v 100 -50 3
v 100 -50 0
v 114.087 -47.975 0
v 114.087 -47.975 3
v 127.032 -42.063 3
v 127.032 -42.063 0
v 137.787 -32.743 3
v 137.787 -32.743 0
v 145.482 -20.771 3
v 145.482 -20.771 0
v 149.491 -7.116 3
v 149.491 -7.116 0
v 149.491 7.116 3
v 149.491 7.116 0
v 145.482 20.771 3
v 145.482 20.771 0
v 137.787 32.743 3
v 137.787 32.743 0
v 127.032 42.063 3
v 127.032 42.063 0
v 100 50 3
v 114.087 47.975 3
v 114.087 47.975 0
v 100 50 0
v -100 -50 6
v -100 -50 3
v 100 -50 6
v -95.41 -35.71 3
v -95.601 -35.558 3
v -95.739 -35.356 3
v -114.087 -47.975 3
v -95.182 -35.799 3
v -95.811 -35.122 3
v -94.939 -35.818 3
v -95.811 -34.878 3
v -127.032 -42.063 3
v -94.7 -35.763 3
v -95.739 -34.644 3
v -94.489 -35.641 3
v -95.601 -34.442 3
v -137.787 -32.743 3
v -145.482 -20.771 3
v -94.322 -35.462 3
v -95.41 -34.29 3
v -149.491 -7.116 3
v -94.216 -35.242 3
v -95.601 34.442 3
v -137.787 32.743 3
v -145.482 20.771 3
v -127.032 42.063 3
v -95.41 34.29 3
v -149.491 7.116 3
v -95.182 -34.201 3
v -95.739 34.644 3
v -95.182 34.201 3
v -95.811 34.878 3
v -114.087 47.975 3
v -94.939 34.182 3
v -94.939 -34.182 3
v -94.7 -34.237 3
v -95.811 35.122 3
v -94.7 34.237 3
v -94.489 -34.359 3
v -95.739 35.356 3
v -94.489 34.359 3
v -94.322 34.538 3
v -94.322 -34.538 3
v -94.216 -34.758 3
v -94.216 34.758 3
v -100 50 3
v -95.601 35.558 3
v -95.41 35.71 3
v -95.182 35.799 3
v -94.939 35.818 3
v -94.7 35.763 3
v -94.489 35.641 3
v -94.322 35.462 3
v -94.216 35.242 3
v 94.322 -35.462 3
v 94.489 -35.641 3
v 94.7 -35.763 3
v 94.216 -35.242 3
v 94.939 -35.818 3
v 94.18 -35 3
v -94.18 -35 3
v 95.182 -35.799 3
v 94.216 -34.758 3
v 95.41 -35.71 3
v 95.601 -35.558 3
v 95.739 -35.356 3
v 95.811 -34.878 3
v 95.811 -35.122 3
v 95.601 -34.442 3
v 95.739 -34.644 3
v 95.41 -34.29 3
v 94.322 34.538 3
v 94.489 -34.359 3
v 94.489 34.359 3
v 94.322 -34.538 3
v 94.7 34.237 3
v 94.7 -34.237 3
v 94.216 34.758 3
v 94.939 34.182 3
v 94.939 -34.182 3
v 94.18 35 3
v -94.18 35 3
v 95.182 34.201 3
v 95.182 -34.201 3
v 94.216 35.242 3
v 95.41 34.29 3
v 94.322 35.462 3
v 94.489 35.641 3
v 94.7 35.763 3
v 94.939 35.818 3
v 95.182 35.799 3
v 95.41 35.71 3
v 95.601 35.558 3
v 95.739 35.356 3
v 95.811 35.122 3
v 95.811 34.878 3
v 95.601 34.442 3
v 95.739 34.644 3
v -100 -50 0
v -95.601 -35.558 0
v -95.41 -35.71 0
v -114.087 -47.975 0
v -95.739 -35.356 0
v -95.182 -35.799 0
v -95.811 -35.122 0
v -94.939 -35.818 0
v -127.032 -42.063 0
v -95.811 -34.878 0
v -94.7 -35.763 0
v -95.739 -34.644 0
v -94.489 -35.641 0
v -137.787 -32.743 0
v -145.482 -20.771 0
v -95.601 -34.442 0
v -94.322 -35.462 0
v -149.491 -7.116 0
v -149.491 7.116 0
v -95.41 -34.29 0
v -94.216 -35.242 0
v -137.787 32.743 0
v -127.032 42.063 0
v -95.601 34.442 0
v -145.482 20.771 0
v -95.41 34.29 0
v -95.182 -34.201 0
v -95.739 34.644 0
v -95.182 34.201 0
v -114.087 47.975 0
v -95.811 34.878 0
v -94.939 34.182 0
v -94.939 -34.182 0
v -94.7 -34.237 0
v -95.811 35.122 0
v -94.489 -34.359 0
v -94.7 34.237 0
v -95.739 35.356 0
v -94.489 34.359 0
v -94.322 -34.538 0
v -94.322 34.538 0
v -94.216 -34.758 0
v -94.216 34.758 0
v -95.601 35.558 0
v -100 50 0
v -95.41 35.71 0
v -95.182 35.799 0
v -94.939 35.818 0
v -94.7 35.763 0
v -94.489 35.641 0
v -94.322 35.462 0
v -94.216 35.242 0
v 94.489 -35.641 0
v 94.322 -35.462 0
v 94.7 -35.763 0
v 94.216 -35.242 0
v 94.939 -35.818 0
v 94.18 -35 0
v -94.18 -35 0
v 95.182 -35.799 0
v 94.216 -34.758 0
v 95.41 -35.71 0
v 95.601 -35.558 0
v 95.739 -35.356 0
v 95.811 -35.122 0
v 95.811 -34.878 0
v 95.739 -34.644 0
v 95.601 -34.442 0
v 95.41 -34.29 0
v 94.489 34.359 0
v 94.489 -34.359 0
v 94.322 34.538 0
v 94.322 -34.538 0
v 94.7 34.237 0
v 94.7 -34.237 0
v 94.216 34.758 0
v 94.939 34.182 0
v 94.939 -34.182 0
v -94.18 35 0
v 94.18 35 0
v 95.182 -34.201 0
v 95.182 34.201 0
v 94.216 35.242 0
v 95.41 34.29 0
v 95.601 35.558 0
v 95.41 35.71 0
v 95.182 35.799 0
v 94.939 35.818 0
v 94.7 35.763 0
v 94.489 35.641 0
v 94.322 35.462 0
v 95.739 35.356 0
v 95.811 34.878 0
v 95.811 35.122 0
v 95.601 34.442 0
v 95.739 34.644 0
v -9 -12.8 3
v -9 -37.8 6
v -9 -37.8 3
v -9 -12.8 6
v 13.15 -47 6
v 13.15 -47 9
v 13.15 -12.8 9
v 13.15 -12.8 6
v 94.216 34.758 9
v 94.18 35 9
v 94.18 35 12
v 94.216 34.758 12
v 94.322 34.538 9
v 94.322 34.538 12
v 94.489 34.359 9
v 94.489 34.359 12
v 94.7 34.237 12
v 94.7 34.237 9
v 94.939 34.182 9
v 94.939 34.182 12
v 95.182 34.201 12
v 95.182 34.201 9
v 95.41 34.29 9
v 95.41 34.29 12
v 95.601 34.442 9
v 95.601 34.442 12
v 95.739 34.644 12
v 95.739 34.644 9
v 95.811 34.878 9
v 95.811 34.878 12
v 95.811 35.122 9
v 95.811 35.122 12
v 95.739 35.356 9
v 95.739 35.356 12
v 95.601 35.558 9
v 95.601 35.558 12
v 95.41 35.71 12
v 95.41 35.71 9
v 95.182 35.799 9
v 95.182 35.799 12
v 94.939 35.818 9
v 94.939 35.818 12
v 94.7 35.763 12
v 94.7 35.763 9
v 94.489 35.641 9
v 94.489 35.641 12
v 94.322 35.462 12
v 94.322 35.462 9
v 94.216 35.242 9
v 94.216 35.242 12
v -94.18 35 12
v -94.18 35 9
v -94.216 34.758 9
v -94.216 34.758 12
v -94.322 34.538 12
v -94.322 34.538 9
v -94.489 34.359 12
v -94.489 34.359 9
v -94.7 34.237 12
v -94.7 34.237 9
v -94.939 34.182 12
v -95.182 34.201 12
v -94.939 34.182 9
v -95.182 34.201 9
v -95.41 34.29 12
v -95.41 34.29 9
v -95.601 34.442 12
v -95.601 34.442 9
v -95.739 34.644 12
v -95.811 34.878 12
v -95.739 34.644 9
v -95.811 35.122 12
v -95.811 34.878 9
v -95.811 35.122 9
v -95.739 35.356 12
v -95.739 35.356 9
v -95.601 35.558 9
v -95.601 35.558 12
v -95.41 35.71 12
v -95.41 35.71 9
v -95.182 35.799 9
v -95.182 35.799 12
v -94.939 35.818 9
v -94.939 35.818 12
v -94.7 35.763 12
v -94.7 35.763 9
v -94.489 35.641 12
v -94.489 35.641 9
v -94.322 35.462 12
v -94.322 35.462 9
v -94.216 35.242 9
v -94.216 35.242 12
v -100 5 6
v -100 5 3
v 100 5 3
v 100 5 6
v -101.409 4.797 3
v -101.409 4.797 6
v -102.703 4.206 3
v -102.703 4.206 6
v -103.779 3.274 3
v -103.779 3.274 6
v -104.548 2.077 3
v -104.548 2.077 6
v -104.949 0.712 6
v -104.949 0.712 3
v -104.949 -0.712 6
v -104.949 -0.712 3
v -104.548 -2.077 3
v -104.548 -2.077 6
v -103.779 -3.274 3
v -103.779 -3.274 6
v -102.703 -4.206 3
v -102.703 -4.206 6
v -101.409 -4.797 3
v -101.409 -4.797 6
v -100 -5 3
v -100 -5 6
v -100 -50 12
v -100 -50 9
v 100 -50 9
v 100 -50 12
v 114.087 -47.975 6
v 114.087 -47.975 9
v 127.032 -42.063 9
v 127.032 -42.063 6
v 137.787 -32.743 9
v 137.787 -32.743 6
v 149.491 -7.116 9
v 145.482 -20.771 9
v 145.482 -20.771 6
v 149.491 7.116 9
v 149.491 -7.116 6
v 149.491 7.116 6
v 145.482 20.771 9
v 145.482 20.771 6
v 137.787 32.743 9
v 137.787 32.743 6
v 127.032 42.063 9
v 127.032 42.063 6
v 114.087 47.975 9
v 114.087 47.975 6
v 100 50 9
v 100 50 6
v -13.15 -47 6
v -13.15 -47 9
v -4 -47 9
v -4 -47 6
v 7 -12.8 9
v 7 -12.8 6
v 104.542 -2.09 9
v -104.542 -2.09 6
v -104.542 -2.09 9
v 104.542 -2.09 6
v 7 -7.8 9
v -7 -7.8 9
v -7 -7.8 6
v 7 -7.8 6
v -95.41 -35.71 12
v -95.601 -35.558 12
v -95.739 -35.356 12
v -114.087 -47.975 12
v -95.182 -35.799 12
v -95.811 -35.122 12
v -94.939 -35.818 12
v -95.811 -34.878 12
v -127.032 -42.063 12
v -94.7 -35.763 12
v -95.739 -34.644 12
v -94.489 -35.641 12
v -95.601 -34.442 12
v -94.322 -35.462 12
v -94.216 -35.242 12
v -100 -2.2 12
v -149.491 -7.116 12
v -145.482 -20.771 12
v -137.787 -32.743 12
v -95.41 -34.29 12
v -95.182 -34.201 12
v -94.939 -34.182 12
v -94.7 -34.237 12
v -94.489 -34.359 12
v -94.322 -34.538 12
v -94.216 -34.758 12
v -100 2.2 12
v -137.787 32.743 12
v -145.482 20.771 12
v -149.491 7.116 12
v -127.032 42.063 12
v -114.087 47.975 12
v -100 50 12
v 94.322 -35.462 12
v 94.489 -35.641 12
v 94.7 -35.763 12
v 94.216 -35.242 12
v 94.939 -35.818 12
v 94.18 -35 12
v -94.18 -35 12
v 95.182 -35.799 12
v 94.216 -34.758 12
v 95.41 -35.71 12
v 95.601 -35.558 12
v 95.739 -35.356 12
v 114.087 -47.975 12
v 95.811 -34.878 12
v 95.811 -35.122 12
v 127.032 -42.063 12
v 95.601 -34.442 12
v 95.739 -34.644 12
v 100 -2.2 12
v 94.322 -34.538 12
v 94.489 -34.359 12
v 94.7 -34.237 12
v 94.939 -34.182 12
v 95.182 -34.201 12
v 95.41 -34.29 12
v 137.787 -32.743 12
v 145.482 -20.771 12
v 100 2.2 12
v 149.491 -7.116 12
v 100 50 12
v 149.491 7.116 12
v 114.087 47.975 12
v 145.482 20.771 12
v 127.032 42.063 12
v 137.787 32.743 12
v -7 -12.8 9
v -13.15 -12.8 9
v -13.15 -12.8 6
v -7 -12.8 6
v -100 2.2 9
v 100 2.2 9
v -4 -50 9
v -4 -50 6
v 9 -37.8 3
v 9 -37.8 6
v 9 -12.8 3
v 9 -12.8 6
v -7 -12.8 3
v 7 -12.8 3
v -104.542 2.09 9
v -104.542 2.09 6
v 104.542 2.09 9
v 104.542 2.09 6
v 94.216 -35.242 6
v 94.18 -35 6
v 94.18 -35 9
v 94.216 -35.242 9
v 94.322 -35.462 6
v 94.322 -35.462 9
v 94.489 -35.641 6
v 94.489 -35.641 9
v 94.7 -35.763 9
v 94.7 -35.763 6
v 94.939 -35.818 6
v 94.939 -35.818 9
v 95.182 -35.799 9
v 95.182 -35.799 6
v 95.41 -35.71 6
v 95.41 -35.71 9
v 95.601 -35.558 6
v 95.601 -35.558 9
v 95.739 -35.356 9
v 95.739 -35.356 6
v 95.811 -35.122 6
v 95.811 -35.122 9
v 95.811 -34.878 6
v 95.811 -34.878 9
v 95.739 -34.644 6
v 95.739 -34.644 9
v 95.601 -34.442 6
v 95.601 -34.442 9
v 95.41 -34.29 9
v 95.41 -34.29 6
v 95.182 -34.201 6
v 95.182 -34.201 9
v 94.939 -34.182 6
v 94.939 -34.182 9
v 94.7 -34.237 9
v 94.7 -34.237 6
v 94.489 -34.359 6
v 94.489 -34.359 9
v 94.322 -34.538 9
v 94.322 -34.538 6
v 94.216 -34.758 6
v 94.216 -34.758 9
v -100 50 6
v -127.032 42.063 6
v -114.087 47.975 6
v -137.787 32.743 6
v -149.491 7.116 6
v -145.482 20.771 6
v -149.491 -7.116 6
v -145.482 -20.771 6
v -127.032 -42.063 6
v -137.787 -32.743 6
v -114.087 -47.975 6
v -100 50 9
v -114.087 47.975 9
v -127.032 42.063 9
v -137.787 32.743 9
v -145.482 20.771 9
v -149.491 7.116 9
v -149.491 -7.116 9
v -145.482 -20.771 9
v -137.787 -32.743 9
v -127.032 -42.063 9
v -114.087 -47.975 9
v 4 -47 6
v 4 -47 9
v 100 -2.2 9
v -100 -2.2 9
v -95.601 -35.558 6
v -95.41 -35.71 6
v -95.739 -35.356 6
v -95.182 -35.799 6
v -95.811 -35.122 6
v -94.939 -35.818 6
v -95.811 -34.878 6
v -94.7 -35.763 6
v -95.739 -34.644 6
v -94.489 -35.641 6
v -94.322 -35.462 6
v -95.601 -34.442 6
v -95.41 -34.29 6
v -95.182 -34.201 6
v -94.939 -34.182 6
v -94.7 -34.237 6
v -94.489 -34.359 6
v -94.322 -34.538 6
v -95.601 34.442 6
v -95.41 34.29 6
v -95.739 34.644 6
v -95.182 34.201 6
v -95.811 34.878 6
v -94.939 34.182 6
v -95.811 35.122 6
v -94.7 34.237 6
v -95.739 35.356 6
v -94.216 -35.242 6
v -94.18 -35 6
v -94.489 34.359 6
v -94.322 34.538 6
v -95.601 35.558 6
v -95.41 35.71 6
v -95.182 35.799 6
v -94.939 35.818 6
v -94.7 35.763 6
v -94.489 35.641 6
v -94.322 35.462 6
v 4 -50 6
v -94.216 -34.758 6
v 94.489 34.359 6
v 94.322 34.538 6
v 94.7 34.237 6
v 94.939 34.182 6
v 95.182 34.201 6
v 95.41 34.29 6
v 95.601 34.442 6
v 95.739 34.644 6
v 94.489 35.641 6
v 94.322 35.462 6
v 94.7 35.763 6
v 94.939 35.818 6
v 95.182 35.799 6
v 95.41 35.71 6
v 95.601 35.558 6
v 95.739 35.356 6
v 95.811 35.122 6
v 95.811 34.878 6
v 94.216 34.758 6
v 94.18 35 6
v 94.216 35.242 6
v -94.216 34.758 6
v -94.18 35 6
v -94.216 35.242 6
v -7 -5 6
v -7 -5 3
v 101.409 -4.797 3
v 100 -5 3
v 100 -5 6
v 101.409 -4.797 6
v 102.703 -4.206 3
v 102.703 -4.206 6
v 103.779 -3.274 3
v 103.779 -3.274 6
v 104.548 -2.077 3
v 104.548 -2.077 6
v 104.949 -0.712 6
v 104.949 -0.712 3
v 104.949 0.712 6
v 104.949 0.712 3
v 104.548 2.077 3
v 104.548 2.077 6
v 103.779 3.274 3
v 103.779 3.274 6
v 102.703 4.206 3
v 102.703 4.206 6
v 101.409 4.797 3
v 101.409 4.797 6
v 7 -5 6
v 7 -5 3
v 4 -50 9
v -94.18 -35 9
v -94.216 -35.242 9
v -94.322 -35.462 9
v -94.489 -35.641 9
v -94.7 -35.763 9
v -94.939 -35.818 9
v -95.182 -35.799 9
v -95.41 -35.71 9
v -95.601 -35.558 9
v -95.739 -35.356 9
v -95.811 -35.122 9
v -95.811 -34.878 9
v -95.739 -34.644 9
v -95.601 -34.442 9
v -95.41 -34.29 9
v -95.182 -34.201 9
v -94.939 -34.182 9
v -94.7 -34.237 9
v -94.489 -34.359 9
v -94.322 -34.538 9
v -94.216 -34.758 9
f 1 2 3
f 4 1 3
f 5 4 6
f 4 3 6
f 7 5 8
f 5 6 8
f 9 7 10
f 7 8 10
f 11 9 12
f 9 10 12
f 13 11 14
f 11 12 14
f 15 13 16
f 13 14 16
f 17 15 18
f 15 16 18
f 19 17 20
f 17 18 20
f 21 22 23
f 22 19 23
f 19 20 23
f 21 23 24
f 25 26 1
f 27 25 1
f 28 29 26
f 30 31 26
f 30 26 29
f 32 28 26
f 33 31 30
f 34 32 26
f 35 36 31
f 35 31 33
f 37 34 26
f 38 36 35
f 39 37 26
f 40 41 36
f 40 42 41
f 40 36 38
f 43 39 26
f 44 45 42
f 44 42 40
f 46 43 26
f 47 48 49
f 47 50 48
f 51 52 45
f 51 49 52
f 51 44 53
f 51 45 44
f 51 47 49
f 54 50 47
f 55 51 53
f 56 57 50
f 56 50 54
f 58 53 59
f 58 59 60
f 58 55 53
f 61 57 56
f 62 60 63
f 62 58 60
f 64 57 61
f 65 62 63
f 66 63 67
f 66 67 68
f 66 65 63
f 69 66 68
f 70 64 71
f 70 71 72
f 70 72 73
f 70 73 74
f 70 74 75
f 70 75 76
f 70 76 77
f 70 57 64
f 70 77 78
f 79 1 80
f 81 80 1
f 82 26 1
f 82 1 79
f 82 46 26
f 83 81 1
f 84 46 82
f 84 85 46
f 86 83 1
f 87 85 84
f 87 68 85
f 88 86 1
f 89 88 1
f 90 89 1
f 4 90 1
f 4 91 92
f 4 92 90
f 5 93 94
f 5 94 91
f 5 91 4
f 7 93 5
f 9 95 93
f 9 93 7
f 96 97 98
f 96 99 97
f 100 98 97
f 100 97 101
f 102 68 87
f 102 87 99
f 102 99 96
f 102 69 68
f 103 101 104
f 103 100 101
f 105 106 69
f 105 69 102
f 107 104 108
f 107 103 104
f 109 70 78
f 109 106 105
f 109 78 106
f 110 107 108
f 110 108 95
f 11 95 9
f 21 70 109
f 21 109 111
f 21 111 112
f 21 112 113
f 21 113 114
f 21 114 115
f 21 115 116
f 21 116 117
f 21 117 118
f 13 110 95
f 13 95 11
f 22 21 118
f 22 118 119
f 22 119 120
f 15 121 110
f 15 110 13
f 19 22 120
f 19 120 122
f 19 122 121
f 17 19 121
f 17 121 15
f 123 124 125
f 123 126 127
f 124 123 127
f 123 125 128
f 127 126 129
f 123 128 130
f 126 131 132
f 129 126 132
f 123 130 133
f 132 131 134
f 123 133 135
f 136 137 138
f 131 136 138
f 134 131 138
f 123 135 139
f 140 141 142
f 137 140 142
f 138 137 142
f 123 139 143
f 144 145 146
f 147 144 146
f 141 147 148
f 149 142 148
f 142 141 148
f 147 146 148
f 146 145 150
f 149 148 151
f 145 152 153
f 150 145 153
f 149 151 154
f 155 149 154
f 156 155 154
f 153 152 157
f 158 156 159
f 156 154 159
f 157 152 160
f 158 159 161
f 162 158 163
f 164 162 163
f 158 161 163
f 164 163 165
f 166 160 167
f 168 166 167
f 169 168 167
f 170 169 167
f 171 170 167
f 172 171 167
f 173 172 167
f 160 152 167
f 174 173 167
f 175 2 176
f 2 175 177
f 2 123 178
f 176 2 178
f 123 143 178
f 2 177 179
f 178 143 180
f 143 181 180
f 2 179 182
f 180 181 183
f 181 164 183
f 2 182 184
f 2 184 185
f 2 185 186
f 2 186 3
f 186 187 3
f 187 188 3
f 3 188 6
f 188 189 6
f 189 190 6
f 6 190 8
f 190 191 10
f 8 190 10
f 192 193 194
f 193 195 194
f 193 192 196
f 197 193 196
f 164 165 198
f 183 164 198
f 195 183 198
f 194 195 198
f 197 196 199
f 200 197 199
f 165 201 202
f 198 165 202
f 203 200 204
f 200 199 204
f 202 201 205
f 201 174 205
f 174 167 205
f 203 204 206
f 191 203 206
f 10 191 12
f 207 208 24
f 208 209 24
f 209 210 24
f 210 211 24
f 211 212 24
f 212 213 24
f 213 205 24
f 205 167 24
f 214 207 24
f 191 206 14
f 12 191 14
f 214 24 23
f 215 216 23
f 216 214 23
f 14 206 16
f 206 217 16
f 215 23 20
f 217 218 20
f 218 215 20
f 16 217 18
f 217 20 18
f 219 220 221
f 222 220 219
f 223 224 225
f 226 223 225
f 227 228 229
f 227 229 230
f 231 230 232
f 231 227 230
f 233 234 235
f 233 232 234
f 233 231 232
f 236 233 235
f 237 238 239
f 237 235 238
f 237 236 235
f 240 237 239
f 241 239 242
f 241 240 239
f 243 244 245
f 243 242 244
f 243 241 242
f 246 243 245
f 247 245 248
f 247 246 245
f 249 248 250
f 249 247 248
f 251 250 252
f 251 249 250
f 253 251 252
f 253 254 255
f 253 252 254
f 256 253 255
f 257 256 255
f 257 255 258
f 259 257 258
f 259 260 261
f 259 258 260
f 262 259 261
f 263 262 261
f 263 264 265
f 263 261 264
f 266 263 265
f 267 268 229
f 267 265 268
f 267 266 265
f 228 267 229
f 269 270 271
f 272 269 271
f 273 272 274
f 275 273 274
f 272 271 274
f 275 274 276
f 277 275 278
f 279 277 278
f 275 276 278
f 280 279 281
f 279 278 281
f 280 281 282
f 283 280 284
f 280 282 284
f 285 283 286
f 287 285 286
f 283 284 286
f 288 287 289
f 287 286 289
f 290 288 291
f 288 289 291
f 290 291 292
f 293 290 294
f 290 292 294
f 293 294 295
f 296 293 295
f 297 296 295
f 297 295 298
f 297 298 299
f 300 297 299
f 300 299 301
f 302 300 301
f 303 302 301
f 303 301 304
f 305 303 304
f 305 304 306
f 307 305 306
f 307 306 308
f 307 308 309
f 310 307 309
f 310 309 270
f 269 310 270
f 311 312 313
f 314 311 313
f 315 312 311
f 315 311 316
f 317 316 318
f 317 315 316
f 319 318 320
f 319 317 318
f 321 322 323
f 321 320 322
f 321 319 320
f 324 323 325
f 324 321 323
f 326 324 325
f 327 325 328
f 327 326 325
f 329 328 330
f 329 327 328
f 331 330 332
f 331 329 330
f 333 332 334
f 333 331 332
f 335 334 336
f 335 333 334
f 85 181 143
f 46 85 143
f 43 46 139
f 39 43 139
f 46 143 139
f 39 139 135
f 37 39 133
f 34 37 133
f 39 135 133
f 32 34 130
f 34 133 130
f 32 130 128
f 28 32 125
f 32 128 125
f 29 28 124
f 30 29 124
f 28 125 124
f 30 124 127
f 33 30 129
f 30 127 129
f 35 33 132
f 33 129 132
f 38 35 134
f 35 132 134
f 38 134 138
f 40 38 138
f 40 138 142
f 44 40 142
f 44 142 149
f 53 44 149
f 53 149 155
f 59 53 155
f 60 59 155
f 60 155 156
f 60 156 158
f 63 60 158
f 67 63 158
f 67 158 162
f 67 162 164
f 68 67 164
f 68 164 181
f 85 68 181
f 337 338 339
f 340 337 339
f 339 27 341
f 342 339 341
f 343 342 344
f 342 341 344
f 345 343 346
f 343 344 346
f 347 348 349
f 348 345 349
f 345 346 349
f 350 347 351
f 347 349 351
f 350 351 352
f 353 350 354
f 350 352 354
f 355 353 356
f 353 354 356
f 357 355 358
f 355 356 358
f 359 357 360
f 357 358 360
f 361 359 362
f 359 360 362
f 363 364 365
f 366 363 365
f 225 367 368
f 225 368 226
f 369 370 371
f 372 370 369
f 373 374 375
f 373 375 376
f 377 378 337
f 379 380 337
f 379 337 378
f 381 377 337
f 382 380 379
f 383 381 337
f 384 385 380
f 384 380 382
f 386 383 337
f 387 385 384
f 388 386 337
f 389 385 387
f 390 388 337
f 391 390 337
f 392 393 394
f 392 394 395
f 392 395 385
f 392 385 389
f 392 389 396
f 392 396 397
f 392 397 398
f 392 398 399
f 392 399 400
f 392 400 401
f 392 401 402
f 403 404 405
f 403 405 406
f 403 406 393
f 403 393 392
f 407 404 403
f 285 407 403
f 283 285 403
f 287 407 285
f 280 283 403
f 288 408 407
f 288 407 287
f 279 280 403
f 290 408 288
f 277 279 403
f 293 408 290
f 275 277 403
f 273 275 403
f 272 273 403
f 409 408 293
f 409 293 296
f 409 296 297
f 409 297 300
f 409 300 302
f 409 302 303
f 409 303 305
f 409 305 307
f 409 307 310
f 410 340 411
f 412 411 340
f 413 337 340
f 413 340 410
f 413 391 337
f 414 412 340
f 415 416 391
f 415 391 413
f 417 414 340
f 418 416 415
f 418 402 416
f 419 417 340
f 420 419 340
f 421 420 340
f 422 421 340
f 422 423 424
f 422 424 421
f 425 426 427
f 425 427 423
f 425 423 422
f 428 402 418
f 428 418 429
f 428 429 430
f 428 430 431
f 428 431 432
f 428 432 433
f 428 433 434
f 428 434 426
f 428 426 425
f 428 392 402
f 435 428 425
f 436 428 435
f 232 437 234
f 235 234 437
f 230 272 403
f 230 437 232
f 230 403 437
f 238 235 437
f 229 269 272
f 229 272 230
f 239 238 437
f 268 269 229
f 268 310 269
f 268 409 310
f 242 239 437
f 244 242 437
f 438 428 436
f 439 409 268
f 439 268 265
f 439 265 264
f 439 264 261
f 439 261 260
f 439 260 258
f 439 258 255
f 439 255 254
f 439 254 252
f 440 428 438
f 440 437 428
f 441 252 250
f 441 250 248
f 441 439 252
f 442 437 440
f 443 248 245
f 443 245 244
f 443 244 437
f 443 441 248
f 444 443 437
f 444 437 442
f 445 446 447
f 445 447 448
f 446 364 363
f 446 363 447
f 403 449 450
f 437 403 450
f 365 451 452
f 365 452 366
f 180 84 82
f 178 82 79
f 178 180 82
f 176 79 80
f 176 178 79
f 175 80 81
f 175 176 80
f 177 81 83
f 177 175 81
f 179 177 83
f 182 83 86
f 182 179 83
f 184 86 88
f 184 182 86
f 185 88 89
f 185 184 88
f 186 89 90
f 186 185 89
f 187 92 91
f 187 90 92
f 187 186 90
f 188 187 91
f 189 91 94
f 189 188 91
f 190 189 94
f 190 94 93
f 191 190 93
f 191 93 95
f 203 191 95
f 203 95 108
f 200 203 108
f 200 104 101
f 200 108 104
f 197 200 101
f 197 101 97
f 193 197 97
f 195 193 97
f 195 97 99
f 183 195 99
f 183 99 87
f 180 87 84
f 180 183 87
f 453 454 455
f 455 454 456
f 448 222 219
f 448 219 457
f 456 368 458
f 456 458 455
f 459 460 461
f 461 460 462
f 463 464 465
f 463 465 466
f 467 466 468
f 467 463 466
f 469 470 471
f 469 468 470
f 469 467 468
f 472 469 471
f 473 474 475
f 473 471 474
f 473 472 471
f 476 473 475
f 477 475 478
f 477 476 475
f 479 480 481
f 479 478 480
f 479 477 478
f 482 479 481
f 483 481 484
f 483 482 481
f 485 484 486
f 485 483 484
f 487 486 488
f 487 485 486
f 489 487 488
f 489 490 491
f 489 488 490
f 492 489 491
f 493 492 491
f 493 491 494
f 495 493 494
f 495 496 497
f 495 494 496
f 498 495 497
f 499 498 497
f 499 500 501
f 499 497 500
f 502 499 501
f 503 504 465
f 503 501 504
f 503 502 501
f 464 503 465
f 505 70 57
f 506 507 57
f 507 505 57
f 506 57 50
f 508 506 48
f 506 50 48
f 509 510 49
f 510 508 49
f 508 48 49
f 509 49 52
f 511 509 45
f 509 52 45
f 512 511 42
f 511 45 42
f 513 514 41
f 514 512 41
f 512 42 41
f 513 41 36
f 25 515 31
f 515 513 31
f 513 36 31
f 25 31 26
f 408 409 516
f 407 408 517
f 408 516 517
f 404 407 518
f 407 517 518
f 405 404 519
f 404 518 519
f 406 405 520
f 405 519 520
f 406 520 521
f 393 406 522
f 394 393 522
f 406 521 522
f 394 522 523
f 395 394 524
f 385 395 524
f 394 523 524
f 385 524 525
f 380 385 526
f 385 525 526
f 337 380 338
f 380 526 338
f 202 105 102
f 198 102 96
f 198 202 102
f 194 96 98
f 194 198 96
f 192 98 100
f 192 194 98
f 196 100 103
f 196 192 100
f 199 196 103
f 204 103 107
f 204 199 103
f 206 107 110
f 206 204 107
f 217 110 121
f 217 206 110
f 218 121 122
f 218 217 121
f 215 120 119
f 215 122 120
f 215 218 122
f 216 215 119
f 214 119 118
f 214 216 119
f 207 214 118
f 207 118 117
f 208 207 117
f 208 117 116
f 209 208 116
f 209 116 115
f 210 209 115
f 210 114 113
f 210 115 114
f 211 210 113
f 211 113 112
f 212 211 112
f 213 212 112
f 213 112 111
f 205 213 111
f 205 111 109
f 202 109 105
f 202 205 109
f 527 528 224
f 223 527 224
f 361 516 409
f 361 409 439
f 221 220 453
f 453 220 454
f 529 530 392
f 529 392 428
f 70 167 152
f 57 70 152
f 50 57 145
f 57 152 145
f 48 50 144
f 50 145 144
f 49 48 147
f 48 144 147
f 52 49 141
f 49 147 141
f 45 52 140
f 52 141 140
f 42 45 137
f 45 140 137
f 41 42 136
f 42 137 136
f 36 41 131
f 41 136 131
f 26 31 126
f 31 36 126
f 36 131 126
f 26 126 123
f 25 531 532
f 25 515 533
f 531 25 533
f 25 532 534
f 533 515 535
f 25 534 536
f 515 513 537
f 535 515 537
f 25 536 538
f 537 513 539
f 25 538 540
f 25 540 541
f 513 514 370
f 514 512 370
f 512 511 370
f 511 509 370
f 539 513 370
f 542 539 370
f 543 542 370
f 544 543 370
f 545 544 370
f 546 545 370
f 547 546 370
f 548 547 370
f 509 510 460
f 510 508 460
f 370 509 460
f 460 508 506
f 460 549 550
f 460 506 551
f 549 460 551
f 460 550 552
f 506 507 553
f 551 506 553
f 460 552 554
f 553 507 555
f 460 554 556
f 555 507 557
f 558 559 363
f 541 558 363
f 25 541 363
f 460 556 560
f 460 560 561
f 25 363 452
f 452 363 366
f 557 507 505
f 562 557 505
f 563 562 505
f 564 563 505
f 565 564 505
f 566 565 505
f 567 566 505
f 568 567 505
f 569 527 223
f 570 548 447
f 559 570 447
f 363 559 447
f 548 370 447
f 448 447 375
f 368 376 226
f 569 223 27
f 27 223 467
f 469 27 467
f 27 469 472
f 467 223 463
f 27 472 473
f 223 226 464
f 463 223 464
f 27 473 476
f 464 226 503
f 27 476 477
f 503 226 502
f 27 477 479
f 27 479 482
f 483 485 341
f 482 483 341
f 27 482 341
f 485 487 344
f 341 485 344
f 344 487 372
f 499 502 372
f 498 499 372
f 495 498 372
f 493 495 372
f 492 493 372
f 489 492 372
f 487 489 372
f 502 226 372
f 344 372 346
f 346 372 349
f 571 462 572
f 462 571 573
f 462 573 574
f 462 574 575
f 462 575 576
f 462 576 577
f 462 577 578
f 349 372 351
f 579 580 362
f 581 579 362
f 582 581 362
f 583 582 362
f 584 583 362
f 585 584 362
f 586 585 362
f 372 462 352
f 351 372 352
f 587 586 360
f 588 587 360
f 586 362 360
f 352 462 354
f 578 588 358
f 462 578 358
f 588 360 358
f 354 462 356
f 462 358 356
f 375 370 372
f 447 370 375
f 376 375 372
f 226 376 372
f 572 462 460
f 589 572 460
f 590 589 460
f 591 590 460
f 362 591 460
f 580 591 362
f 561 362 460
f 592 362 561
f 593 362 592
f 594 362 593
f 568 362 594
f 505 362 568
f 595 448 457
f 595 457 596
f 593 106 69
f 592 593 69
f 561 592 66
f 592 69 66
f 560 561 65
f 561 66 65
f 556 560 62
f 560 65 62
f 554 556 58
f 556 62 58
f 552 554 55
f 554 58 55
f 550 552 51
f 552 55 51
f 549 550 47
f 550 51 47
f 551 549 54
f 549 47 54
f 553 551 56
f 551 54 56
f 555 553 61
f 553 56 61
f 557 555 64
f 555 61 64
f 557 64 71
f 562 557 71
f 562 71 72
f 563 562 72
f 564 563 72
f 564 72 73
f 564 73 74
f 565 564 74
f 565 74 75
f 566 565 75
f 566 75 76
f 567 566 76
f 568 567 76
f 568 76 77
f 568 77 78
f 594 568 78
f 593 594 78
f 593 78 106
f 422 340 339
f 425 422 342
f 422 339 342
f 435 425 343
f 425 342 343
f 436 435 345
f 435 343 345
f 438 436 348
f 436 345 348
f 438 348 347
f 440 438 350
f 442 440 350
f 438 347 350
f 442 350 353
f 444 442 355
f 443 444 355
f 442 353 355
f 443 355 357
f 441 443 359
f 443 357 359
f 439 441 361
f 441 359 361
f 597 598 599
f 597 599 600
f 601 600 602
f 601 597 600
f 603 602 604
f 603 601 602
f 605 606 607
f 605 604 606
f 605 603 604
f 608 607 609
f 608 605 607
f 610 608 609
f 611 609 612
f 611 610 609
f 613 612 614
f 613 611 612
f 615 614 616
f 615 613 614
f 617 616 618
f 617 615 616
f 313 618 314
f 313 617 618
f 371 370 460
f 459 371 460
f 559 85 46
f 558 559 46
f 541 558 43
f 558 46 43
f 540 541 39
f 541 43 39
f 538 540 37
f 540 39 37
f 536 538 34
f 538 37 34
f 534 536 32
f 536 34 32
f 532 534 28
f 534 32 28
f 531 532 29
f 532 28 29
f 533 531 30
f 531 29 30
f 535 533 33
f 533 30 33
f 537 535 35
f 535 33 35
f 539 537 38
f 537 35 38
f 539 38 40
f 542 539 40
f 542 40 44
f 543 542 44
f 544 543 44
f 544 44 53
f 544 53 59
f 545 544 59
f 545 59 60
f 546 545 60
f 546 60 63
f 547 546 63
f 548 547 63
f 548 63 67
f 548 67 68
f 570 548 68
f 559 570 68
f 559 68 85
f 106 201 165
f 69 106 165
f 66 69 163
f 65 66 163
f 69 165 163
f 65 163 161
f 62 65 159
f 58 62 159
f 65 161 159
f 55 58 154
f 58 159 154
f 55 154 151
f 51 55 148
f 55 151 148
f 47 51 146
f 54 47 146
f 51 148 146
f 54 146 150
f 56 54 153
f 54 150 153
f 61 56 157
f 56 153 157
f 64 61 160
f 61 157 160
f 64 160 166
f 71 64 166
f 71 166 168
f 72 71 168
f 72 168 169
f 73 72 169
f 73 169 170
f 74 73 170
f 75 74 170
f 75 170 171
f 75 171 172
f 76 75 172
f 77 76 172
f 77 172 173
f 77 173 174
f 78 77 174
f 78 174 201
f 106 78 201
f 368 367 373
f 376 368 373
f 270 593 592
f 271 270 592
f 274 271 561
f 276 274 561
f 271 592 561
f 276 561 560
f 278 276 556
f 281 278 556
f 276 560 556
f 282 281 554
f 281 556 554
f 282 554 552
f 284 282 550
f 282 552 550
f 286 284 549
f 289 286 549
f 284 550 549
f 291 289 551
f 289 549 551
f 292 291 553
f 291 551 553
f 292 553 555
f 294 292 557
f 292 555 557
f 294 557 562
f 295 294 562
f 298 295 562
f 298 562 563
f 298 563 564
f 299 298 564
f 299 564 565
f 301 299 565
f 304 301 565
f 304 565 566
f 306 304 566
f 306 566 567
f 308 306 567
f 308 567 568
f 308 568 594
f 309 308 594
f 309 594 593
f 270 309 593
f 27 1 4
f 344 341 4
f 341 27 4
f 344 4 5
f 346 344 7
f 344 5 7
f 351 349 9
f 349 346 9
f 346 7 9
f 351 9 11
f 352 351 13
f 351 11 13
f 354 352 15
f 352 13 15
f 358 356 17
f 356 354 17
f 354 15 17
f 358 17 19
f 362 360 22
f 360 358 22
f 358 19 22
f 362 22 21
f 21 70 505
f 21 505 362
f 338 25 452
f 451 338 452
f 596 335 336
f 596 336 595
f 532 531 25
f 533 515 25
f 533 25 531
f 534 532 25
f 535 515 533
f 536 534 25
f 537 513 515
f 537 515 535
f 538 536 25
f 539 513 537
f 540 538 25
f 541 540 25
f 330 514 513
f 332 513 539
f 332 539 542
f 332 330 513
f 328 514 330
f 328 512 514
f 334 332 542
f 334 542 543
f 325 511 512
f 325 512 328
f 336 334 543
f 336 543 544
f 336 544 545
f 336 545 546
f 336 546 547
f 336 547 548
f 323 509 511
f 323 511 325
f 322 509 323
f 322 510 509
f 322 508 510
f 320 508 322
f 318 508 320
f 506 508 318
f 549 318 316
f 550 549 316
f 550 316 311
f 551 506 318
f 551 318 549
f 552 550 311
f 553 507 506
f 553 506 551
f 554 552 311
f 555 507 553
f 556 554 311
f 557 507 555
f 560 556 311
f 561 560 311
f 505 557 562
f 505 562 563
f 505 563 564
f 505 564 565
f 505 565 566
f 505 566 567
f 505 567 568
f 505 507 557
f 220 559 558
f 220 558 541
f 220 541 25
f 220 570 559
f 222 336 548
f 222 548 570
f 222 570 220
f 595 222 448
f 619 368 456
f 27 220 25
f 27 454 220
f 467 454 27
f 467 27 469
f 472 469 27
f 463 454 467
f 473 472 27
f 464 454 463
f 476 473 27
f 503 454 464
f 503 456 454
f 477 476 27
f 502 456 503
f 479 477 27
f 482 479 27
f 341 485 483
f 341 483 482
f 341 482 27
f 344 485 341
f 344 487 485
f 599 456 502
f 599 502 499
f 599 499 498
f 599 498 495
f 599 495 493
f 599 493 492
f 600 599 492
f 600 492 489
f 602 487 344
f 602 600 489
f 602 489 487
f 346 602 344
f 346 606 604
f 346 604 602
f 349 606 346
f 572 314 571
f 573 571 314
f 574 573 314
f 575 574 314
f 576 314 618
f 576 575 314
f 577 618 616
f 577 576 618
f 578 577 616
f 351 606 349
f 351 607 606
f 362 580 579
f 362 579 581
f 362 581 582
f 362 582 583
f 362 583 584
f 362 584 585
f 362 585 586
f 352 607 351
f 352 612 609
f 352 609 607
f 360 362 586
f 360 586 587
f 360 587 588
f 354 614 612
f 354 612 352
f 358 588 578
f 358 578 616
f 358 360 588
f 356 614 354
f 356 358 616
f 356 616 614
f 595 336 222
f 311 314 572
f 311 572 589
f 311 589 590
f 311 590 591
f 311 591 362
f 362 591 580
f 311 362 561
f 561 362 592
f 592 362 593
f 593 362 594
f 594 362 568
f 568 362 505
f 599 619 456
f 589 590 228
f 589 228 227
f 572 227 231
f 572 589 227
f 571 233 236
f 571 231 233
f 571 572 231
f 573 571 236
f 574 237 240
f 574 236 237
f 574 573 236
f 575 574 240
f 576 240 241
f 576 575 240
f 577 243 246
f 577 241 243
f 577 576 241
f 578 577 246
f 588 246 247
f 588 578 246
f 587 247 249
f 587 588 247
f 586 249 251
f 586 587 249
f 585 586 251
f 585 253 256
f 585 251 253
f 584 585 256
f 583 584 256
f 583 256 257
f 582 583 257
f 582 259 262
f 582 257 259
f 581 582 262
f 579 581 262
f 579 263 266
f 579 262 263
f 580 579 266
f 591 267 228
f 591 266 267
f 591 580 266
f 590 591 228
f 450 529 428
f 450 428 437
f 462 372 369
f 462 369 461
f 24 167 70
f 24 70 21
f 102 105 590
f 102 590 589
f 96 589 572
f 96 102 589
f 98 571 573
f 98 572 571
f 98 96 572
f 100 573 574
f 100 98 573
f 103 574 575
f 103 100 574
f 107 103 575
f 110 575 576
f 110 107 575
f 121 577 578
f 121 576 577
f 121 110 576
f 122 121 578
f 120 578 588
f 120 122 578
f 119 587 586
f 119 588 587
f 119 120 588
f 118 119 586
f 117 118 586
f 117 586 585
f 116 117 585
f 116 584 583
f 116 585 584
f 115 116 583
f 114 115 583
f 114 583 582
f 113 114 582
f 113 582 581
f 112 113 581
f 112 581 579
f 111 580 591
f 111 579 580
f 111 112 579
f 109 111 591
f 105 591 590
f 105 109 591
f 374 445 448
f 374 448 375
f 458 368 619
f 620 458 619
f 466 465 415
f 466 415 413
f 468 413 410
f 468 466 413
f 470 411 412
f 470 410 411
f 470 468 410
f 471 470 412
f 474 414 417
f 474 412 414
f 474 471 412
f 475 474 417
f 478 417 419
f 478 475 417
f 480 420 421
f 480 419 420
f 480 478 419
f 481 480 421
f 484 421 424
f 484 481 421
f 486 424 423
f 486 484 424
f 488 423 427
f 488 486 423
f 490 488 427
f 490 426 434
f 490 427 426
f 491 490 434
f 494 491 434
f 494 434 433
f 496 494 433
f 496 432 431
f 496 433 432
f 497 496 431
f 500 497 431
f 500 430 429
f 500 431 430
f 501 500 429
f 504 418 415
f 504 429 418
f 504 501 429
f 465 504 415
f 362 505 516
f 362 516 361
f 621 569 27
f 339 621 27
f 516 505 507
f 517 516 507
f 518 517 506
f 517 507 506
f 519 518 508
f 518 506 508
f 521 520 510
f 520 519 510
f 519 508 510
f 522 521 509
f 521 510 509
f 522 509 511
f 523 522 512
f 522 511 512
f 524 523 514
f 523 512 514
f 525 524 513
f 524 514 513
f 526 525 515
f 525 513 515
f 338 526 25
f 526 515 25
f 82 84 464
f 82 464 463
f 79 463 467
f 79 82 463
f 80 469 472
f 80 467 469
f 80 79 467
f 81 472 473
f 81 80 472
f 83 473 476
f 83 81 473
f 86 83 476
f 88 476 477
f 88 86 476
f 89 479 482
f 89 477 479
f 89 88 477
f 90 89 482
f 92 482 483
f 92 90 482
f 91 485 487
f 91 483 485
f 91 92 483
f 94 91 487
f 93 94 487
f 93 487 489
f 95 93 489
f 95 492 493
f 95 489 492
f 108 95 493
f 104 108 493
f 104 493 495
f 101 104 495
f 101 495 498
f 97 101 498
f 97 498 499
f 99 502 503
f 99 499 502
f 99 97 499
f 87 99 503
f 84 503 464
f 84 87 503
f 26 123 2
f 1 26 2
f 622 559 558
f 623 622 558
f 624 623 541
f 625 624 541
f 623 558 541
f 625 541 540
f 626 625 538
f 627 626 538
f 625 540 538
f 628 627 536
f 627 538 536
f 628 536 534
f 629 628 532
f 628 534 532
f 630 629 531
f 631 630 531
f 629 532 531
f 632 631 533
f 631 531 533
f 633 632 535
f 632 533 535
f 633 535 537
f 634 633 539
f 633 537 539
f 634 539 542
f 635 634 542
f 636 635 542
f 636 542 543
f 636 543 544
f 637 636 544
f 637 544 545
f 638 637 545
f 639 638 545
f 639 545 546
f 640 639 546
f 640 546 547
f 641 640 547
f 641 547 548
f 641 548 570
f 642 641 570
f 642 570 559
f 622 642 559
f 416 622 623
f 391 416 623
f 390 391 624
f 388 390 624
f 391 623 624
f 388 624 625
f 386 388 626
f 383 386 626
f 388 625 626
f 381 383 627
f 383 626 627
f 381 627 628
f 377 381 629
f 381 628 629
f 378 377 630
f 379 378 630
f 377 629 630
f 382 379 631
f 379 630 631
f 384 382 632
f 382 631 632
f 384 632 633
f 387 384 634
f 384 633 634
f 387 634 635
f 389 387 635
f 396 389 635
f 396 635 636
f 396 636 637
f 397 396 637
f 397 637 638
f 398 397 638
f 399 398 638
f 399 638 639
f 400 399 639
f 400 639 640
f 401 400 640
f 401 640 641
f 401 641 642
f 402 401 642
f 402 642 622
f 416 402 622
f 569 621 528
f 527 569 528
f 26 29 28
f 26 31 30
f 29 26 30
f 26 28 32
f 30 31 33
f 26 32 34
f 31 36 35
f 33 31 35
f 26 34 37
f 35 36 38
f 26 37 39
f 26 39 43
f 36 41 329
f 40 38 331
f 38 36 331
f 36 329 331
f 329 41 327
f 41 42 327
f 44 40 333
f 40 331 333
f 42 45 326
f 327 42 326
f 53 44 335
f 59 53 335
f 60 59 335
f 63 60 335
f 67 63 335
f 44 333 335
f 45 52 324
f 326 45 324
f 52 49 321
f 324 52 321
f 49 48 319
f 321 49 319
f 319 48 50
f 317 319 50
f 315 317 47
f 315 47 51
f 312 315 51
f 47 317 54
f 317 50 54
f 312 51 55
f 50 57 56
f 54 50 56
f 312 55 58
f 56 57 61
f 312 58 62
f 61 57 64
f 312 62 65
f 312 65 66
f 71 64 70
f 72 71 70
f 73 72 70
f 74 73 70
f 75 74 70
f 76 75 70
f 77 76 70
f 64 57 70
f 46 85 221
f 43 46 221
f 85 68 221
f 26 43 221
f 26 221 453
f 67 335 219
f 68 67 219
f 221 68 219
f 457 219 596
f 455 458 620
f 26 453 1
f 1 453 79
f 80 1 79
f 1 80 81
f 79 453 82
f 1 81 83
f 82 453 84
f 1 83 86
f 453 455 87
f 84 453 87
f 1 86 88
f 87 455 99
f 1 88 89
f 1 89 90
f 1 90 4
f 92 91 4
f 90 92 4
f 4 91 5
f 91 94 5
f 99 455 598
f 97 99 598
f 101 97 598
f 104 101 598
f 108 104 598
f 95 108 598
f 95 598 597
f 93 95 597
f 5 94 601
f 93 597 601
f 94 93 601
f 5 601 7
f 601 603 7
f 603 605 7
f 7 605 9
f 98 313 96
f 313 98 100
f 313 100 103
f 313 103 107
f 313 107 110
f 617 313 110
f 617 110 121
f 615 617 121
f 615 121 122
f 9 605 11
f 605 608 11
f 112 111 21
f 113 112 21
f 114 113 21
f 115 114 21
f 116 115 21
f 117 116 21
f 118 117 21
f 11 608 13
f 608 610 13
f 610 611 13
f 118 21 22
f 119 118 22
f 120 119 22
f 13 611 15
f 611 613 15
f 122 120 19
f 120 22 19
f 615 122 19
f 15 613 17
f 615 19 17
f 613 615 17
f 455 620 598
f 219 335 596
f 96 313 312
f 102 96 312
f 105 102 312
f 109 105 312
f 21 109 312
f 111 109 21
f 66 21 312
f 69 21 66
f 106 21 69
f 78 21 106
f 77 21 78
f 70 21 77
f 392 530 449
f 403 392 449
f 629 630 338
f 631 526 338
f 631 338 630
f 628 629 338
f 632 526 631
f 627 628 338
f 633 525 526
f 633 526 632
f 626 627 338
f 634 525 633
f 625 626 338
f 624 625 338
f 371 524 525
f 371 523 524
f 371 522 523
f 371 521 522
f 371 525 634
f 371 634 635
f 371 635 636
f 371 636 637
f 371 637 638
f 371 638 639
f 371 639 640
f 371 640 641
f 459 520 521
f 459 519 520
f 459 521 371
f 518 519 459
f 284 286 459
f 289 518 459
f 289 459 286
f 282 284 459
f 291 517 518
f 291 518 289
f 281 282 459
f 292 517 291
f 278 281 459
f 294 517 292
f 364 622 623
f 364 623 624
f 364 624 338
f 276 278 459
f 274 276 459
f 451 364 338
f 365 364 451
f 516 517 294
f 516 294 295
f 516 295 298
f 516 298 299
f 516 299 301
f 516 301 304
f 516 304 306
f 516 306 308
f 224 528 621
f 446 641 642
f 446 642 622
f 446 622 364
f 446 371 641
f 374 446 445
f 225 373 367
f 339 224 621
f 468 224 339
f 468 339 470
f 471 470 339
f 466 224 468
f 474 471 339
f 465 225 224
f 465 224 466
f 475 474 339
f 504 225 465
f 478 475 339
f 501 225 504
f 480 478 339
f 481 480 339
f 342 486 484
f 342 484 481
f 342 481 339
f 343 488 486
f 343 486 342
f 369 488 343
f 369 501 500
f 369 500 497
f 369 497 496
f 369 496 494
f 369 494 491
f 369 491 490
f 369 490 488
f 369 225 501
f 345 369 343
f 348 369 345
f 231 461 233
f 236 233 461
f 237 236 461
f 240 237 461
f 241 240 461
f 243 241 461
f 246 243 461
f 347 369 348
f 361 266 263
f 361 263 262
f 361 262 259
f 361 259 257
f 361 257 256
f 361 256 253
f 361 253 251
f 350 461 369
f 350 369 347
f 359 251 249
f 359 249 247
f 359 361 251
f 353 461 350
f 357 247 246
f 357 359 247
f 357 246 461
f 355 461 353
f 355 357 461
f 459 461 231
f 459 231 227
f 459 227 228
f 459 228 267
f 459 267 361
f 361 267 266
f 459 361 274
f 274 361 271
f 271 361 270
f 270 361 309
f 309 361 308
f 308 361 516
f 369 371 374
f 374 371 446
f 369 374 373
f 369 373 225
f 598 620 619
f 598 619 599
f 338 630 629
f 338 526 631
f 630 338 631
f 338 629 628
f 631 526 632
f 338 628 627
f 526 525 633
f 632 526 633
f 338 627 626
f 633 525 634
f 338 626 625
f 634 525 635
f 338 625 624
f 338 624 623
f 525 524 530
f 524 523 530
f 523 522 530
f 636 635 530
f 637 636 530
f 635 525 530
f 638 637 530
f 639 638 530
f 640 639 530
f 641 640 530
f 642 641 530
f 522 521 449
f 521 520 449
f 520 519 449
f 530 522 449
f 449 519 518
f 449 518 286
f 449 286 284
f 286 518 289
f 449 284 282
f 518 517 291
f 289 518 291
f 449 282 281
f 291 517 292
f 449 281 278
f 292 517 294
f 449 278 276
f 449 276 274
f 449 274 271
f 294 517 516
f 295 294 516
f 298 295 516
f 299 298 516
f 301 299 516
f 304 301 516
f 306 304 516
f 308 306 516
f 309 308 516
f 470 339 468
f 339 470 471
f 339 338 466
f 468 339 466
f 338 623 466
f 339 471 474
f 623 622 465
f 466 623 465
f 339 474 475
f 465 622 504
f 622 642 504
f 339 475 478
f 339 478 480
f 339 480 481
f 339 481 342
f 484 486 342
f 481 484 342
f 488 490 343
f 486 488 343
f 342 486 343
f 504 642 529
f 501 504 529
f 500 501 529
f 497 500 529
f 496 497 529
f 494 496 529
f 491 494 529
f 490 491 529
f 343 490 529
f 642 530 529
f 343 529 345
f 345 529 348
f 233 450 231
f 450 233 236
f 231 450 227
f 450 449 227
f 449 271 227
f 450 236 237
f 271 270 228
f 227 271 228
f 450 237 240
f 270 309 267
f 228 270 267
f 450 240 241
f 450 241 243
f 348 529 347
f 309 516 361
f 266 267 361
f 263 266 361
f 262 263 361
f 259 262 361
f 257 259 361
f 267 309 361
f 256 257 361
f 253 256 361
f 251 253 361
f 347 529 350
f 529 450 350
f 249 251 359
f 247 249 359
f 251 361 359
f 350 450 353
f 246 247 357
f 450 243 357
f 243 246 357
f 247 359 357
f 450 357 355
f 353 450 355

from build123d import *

# Parameters (mm, degrees)
BOX_BOTTOM_HALF_1_W     = 301.98633
BOX_BOTTOM_HALF_1_H     = 102
BOX_BOTTOM_HALF_1_DEPTH = 4
BOX_BOTTOM_HALF_0_W     = 301.98633
BOX_BOTTOM_HALF_0_H     = 102
BOX_BOTTOM_HALF_0_DEPTH = 7
PAD_DEPTH               = 3
PAD001_DEPTH            = 3
SKETCH002_W             = 209.08447
SKETCH002_H             = 4.18
PAD002_DEPTH            = 3
SKETCH003_W             = 26.3
SKETCH003_H             = 34.2
POCKET_DEPTH            = 3
SKETCH004_W             = 18
SKETCH004_H             = 25
POCKET001_DEPTH         = 3
SKETCH005_W             = 14
SKETCH005_H             = 5
POCKET002_DEPTH         = 6
SKETCH006_W             = 14
SKETCH006_H             = 3
POCKET003_DEPTH         = 3
SKETCH007_W             = 8
SKETCH007_H             = 3
POCKET004_DEPTH         = 3
SKETCH008_W             = 200
SKETCH008_H             = 4.4
PAD003_DEPTH            = 3
SKETCH009_R             = 0.82
POCKET005_DEPTH         = 644.911736
BOX_BOTTOM_HALF_2_W     = 301.98633
BOX_BOTTOM_HALF_2_H     = 102
BOX_BOTTOM_HALF_2_DEPTH = 4


with BuildPart() as box_bottom_half_1_body:
    # box_bottom_half_1 → box_bottom_half_1 (new body)
    with BuildSketch(Plane(origin=(-150.993165, -51, -1), x_dir=(1, 0, 0), z_dir=(0, 0, 1))):
        with Locations((150.993165, 51)):
            Rectangle(BOX_BOTTOM_HALF_1_W, BOX_BOTTOM_HALF_1_H)
    extrude(amount=BOX_BOTTOM_HALF_1_DEPTH)


with BuildPart() as box_bottom_half_0_body:
    # box_bottom_half_0 → box_bottom_half_0 (new body)
    with BuildSketch(Plane(origin=(-150.993165, -51, -1), x_dir=(1, 0, 0), z_dir=(0, 0, 1))):
        with Locations((150.993165, 51)):
            Rectangle(BOX_BOTTOM_HALF_0_W, BOX_BOTTOM_HALF_0_H)
    extrude(amount=BOX_BOTTOM_HALF_0_DEPTH)


with BuildPart() as body:
    # Sketch → Pad (new body)
    with BuildSketch(Plane.XY):
        with BuildLine():
            ThreePointArc((-100, 50), (-150, 0), (-100, -50))
            Line((-100, -50), (100, -50))
            ThreePointArc((100, -50), (150, 0), (100, 50))
            Line((-100, 50), (100, 50))
        make_face()
    extrude(amount=PAD_DEPTH)

    # Sketch001 (on Face6 of Pad) → Pad001 (join)
    with BuildSketch(Plane.XY.offset(3)):
        with BuildLine():
            ThreePointArc((-100, 50), (-150, 0), (-100, -50))
            Line((-100, -50), (100, -50))
            ThreePointArc((100, -50), (150, 0), (100, 50))
            Line((-100, 50), (100, 50))
        make_face()
        with BuildLine():
            ThreePointArc((-100, 5), (-105, 0), (-100, -5))
            Line((-100, -5), (100, -5))
            ThreePointArc((100, -5), (105, 0), (100, 5))
            Line((-100, 5), (100, 5))
        make_face(mode=Mode.SUBTRACT)
    extrude(amount=PAD001_DEPTH)

    # Sketch002 (on Face9 of Pad001) → Pad002 (join)
    with BuildSketch(Plane.XY.offset(6)):
        with BuildLine():
            ThreePointArc((-100, 50), (-150, 0), (-100, -50))
            Line((-100, -50), (100, -50))
            ThreePointArc((100, -50), (150, 0), (100, 50))
            Line((-100, 50), (100, 50))
        make_face()
        Rectangle(SKETCH002_W, SKETCH002_H, mode=Mode.SUBTRACT)
    extrude(amount=PAD002_DEPTH)

    # Sketch003 (on Face13 of Pad002) → Pocket (cut)
    with BuildSketch(Plane.XY.offset(9)):
        with Locations((0, -29.9)):
            Rectangle(SKETCH003_W, SKETCH003_H)
    extrude(amount=-POCKET_DEPTH, mode=Mode.SUBTRACT)

    # Sketch004 (on Face27 of Pocket) → Pocket001 (cut)
    with BuildSketch(Plane.XY.offset(6)):
        with Locations((0, -25.3)):
            Rectangle(SKETCH004_W, SKETCH004_H)
    extrude(amount=-POCKET001_DEPTH, mode=Mode.SUBTRACT)

    # Sketch005 (on Face13 of Pocket001) → Pocket002 (cut)
    with BuildSketch(Plane.XY.offset(9)):
        with Locations((0, -10.3)):
            Rectangle(SKETCH005_W, SKETCH005_H)
    extrude(amount=-POCKET002_DEPTH, mode=Mode.SUBTRACT)

    # Sketch006 (on Face23 of Pocket002) → Pocket003 (cut)
    with BuildSketch(Plane.XZ.offset(7.8)):
        with Locations((0, 4.5)):
            Rectangle(SKETCH006_W, SKETCH006_H)
    extrude(amount=-POCKET003_DEPTH, mode=Mode.SUBTRACT)

    # Sketch007 (on Face13 of Pocket003) → Pocket004 (cut)
    with BuildSketch(Plane.XY.offset(9)):
        with Locations((0, -48.5)):
            Rectangle(SKETCH007_W, SKETCH007_H)
    extrude(amount=-POCKET004_DEPTH, mode=Mode.SUBTRACT)

    # Sketch008 (on Face15 of Pocket004) → Pad003 (join)
    with BuildSketch(Plane.XY.offset(9)):
        with BuildLine():
            ThreePointArc((-100, 50), (-150, 0), (-100, -50))
            Line((-100, -50), (100, -50))
            ThreePointArc((100, -50), (150, 0), (100, 50))
            Line((-100, 50), (100, 50))
        make_face()
        Rectangle(SKETCH008_W, SKETCH008_H, mode=Mode.SUBTRACT)
    extrude(amount=PAD003_DEPTH)

    # Sketch009 (on Face4 of Pad003) → Pocket005 (cut, through all)
    with BuildSketch(Plane(origin=(0, 0, 0), x_dir=(1, 0, 0), z_dir=(0, 0, -1))):
        with Locations((-95, 35)):
            Circle(SKETCH009_R)
        with Locations((-95, -35)):
            Circle(SKETCH009_R)
    pocket005 = extrude(amount=-POCKET005_DEPTH, mode=Mode.SUBTRACT)

    # Mirrored: Pocket005 across Sketch009 V_Axis
    add(pocket005.mirror(Plane(origin=(0, 0, 0), x_dir=(0, 0, -1), z_dir=(1, 0, 0))), mode=Mode.SUBTRACT)


with BuildPart() as bottom_half_0_body:
    # bottom_half_0 base: copy of Body
    add(body.part)

    # bottom_half_0: intersect box_bottom_half_0 body
    add(box_bottom_half_0_body.part, mode=Mode.INTERSECT)


with BuildPart() as bottom_half_1_body:
    # bottom_half_1 base: copy of bottom_half_0 body
    add(bottom_half_0_body.part)

    # bottom_half_1: intersect box_bottom_half_1 body
    add(box_bottom_half_1_body.part, mode=Mode.INTERSECT)


with BuildPart() as top_half_1_body:
    # top_half_1 base: copy of bottom_half_0 body
    add(bottom_half_0_body.part)

    # top_half_1: cut box_bottom_half_1 body
    add(box_bottom_half_1_body.part, mode=Mode.SUBTRACT)


with BuildPart() as box_bottom_half_2_body:
    # box_bottom_half_2 → box_bottom_half_2 (new body)
    with BuildSketch(Plane(origin=(-150.993165, -51, 5), x_dir=(1, 0, 0), z_dir=(0, 0, 1))):
        with Locations((150.993165, 51)):
            Rectangle(BOX_BOTTOM_HALF_2_W, BOX_BOTTOM_HALF_2_H)
    extrude(amount=BOX_BOTTOM_HALF_2_DEPTH)


with BuildPart() as top_half_0_body:
    # top_half_0 base: copy of Body
    add(body.part)

    # top_half_0: cut box_bottom_half_0 body
    add(box_bottom_half_0_body.part, mode=Mode.SUBTRACT)


with BuildPart() as bottom_half_2_body:
    # bottom_half_2 base: copy of top_half_0 body
    add(top_half_0_body.part)

    # bottom_half_2: intersect box_bottom_half_2 body
    add(box_bottom_half_2_body.part, mode=Mode.INTERSECT)


with BuildPart() as top_half_2_body:
    # top_half_2 base: copy of top_half_0 body
    add(top_half_0_body.part)

    # top_half_2: cut box_bottom_half_2 body
    add(box_bottom_half_2_body.part, mode=Mode.SUBTRACT)


solid = Compound([bottom_half_1_body.part, top_half_1_body.part, bottom_half_2_body.part, top_half_2_body.part])
